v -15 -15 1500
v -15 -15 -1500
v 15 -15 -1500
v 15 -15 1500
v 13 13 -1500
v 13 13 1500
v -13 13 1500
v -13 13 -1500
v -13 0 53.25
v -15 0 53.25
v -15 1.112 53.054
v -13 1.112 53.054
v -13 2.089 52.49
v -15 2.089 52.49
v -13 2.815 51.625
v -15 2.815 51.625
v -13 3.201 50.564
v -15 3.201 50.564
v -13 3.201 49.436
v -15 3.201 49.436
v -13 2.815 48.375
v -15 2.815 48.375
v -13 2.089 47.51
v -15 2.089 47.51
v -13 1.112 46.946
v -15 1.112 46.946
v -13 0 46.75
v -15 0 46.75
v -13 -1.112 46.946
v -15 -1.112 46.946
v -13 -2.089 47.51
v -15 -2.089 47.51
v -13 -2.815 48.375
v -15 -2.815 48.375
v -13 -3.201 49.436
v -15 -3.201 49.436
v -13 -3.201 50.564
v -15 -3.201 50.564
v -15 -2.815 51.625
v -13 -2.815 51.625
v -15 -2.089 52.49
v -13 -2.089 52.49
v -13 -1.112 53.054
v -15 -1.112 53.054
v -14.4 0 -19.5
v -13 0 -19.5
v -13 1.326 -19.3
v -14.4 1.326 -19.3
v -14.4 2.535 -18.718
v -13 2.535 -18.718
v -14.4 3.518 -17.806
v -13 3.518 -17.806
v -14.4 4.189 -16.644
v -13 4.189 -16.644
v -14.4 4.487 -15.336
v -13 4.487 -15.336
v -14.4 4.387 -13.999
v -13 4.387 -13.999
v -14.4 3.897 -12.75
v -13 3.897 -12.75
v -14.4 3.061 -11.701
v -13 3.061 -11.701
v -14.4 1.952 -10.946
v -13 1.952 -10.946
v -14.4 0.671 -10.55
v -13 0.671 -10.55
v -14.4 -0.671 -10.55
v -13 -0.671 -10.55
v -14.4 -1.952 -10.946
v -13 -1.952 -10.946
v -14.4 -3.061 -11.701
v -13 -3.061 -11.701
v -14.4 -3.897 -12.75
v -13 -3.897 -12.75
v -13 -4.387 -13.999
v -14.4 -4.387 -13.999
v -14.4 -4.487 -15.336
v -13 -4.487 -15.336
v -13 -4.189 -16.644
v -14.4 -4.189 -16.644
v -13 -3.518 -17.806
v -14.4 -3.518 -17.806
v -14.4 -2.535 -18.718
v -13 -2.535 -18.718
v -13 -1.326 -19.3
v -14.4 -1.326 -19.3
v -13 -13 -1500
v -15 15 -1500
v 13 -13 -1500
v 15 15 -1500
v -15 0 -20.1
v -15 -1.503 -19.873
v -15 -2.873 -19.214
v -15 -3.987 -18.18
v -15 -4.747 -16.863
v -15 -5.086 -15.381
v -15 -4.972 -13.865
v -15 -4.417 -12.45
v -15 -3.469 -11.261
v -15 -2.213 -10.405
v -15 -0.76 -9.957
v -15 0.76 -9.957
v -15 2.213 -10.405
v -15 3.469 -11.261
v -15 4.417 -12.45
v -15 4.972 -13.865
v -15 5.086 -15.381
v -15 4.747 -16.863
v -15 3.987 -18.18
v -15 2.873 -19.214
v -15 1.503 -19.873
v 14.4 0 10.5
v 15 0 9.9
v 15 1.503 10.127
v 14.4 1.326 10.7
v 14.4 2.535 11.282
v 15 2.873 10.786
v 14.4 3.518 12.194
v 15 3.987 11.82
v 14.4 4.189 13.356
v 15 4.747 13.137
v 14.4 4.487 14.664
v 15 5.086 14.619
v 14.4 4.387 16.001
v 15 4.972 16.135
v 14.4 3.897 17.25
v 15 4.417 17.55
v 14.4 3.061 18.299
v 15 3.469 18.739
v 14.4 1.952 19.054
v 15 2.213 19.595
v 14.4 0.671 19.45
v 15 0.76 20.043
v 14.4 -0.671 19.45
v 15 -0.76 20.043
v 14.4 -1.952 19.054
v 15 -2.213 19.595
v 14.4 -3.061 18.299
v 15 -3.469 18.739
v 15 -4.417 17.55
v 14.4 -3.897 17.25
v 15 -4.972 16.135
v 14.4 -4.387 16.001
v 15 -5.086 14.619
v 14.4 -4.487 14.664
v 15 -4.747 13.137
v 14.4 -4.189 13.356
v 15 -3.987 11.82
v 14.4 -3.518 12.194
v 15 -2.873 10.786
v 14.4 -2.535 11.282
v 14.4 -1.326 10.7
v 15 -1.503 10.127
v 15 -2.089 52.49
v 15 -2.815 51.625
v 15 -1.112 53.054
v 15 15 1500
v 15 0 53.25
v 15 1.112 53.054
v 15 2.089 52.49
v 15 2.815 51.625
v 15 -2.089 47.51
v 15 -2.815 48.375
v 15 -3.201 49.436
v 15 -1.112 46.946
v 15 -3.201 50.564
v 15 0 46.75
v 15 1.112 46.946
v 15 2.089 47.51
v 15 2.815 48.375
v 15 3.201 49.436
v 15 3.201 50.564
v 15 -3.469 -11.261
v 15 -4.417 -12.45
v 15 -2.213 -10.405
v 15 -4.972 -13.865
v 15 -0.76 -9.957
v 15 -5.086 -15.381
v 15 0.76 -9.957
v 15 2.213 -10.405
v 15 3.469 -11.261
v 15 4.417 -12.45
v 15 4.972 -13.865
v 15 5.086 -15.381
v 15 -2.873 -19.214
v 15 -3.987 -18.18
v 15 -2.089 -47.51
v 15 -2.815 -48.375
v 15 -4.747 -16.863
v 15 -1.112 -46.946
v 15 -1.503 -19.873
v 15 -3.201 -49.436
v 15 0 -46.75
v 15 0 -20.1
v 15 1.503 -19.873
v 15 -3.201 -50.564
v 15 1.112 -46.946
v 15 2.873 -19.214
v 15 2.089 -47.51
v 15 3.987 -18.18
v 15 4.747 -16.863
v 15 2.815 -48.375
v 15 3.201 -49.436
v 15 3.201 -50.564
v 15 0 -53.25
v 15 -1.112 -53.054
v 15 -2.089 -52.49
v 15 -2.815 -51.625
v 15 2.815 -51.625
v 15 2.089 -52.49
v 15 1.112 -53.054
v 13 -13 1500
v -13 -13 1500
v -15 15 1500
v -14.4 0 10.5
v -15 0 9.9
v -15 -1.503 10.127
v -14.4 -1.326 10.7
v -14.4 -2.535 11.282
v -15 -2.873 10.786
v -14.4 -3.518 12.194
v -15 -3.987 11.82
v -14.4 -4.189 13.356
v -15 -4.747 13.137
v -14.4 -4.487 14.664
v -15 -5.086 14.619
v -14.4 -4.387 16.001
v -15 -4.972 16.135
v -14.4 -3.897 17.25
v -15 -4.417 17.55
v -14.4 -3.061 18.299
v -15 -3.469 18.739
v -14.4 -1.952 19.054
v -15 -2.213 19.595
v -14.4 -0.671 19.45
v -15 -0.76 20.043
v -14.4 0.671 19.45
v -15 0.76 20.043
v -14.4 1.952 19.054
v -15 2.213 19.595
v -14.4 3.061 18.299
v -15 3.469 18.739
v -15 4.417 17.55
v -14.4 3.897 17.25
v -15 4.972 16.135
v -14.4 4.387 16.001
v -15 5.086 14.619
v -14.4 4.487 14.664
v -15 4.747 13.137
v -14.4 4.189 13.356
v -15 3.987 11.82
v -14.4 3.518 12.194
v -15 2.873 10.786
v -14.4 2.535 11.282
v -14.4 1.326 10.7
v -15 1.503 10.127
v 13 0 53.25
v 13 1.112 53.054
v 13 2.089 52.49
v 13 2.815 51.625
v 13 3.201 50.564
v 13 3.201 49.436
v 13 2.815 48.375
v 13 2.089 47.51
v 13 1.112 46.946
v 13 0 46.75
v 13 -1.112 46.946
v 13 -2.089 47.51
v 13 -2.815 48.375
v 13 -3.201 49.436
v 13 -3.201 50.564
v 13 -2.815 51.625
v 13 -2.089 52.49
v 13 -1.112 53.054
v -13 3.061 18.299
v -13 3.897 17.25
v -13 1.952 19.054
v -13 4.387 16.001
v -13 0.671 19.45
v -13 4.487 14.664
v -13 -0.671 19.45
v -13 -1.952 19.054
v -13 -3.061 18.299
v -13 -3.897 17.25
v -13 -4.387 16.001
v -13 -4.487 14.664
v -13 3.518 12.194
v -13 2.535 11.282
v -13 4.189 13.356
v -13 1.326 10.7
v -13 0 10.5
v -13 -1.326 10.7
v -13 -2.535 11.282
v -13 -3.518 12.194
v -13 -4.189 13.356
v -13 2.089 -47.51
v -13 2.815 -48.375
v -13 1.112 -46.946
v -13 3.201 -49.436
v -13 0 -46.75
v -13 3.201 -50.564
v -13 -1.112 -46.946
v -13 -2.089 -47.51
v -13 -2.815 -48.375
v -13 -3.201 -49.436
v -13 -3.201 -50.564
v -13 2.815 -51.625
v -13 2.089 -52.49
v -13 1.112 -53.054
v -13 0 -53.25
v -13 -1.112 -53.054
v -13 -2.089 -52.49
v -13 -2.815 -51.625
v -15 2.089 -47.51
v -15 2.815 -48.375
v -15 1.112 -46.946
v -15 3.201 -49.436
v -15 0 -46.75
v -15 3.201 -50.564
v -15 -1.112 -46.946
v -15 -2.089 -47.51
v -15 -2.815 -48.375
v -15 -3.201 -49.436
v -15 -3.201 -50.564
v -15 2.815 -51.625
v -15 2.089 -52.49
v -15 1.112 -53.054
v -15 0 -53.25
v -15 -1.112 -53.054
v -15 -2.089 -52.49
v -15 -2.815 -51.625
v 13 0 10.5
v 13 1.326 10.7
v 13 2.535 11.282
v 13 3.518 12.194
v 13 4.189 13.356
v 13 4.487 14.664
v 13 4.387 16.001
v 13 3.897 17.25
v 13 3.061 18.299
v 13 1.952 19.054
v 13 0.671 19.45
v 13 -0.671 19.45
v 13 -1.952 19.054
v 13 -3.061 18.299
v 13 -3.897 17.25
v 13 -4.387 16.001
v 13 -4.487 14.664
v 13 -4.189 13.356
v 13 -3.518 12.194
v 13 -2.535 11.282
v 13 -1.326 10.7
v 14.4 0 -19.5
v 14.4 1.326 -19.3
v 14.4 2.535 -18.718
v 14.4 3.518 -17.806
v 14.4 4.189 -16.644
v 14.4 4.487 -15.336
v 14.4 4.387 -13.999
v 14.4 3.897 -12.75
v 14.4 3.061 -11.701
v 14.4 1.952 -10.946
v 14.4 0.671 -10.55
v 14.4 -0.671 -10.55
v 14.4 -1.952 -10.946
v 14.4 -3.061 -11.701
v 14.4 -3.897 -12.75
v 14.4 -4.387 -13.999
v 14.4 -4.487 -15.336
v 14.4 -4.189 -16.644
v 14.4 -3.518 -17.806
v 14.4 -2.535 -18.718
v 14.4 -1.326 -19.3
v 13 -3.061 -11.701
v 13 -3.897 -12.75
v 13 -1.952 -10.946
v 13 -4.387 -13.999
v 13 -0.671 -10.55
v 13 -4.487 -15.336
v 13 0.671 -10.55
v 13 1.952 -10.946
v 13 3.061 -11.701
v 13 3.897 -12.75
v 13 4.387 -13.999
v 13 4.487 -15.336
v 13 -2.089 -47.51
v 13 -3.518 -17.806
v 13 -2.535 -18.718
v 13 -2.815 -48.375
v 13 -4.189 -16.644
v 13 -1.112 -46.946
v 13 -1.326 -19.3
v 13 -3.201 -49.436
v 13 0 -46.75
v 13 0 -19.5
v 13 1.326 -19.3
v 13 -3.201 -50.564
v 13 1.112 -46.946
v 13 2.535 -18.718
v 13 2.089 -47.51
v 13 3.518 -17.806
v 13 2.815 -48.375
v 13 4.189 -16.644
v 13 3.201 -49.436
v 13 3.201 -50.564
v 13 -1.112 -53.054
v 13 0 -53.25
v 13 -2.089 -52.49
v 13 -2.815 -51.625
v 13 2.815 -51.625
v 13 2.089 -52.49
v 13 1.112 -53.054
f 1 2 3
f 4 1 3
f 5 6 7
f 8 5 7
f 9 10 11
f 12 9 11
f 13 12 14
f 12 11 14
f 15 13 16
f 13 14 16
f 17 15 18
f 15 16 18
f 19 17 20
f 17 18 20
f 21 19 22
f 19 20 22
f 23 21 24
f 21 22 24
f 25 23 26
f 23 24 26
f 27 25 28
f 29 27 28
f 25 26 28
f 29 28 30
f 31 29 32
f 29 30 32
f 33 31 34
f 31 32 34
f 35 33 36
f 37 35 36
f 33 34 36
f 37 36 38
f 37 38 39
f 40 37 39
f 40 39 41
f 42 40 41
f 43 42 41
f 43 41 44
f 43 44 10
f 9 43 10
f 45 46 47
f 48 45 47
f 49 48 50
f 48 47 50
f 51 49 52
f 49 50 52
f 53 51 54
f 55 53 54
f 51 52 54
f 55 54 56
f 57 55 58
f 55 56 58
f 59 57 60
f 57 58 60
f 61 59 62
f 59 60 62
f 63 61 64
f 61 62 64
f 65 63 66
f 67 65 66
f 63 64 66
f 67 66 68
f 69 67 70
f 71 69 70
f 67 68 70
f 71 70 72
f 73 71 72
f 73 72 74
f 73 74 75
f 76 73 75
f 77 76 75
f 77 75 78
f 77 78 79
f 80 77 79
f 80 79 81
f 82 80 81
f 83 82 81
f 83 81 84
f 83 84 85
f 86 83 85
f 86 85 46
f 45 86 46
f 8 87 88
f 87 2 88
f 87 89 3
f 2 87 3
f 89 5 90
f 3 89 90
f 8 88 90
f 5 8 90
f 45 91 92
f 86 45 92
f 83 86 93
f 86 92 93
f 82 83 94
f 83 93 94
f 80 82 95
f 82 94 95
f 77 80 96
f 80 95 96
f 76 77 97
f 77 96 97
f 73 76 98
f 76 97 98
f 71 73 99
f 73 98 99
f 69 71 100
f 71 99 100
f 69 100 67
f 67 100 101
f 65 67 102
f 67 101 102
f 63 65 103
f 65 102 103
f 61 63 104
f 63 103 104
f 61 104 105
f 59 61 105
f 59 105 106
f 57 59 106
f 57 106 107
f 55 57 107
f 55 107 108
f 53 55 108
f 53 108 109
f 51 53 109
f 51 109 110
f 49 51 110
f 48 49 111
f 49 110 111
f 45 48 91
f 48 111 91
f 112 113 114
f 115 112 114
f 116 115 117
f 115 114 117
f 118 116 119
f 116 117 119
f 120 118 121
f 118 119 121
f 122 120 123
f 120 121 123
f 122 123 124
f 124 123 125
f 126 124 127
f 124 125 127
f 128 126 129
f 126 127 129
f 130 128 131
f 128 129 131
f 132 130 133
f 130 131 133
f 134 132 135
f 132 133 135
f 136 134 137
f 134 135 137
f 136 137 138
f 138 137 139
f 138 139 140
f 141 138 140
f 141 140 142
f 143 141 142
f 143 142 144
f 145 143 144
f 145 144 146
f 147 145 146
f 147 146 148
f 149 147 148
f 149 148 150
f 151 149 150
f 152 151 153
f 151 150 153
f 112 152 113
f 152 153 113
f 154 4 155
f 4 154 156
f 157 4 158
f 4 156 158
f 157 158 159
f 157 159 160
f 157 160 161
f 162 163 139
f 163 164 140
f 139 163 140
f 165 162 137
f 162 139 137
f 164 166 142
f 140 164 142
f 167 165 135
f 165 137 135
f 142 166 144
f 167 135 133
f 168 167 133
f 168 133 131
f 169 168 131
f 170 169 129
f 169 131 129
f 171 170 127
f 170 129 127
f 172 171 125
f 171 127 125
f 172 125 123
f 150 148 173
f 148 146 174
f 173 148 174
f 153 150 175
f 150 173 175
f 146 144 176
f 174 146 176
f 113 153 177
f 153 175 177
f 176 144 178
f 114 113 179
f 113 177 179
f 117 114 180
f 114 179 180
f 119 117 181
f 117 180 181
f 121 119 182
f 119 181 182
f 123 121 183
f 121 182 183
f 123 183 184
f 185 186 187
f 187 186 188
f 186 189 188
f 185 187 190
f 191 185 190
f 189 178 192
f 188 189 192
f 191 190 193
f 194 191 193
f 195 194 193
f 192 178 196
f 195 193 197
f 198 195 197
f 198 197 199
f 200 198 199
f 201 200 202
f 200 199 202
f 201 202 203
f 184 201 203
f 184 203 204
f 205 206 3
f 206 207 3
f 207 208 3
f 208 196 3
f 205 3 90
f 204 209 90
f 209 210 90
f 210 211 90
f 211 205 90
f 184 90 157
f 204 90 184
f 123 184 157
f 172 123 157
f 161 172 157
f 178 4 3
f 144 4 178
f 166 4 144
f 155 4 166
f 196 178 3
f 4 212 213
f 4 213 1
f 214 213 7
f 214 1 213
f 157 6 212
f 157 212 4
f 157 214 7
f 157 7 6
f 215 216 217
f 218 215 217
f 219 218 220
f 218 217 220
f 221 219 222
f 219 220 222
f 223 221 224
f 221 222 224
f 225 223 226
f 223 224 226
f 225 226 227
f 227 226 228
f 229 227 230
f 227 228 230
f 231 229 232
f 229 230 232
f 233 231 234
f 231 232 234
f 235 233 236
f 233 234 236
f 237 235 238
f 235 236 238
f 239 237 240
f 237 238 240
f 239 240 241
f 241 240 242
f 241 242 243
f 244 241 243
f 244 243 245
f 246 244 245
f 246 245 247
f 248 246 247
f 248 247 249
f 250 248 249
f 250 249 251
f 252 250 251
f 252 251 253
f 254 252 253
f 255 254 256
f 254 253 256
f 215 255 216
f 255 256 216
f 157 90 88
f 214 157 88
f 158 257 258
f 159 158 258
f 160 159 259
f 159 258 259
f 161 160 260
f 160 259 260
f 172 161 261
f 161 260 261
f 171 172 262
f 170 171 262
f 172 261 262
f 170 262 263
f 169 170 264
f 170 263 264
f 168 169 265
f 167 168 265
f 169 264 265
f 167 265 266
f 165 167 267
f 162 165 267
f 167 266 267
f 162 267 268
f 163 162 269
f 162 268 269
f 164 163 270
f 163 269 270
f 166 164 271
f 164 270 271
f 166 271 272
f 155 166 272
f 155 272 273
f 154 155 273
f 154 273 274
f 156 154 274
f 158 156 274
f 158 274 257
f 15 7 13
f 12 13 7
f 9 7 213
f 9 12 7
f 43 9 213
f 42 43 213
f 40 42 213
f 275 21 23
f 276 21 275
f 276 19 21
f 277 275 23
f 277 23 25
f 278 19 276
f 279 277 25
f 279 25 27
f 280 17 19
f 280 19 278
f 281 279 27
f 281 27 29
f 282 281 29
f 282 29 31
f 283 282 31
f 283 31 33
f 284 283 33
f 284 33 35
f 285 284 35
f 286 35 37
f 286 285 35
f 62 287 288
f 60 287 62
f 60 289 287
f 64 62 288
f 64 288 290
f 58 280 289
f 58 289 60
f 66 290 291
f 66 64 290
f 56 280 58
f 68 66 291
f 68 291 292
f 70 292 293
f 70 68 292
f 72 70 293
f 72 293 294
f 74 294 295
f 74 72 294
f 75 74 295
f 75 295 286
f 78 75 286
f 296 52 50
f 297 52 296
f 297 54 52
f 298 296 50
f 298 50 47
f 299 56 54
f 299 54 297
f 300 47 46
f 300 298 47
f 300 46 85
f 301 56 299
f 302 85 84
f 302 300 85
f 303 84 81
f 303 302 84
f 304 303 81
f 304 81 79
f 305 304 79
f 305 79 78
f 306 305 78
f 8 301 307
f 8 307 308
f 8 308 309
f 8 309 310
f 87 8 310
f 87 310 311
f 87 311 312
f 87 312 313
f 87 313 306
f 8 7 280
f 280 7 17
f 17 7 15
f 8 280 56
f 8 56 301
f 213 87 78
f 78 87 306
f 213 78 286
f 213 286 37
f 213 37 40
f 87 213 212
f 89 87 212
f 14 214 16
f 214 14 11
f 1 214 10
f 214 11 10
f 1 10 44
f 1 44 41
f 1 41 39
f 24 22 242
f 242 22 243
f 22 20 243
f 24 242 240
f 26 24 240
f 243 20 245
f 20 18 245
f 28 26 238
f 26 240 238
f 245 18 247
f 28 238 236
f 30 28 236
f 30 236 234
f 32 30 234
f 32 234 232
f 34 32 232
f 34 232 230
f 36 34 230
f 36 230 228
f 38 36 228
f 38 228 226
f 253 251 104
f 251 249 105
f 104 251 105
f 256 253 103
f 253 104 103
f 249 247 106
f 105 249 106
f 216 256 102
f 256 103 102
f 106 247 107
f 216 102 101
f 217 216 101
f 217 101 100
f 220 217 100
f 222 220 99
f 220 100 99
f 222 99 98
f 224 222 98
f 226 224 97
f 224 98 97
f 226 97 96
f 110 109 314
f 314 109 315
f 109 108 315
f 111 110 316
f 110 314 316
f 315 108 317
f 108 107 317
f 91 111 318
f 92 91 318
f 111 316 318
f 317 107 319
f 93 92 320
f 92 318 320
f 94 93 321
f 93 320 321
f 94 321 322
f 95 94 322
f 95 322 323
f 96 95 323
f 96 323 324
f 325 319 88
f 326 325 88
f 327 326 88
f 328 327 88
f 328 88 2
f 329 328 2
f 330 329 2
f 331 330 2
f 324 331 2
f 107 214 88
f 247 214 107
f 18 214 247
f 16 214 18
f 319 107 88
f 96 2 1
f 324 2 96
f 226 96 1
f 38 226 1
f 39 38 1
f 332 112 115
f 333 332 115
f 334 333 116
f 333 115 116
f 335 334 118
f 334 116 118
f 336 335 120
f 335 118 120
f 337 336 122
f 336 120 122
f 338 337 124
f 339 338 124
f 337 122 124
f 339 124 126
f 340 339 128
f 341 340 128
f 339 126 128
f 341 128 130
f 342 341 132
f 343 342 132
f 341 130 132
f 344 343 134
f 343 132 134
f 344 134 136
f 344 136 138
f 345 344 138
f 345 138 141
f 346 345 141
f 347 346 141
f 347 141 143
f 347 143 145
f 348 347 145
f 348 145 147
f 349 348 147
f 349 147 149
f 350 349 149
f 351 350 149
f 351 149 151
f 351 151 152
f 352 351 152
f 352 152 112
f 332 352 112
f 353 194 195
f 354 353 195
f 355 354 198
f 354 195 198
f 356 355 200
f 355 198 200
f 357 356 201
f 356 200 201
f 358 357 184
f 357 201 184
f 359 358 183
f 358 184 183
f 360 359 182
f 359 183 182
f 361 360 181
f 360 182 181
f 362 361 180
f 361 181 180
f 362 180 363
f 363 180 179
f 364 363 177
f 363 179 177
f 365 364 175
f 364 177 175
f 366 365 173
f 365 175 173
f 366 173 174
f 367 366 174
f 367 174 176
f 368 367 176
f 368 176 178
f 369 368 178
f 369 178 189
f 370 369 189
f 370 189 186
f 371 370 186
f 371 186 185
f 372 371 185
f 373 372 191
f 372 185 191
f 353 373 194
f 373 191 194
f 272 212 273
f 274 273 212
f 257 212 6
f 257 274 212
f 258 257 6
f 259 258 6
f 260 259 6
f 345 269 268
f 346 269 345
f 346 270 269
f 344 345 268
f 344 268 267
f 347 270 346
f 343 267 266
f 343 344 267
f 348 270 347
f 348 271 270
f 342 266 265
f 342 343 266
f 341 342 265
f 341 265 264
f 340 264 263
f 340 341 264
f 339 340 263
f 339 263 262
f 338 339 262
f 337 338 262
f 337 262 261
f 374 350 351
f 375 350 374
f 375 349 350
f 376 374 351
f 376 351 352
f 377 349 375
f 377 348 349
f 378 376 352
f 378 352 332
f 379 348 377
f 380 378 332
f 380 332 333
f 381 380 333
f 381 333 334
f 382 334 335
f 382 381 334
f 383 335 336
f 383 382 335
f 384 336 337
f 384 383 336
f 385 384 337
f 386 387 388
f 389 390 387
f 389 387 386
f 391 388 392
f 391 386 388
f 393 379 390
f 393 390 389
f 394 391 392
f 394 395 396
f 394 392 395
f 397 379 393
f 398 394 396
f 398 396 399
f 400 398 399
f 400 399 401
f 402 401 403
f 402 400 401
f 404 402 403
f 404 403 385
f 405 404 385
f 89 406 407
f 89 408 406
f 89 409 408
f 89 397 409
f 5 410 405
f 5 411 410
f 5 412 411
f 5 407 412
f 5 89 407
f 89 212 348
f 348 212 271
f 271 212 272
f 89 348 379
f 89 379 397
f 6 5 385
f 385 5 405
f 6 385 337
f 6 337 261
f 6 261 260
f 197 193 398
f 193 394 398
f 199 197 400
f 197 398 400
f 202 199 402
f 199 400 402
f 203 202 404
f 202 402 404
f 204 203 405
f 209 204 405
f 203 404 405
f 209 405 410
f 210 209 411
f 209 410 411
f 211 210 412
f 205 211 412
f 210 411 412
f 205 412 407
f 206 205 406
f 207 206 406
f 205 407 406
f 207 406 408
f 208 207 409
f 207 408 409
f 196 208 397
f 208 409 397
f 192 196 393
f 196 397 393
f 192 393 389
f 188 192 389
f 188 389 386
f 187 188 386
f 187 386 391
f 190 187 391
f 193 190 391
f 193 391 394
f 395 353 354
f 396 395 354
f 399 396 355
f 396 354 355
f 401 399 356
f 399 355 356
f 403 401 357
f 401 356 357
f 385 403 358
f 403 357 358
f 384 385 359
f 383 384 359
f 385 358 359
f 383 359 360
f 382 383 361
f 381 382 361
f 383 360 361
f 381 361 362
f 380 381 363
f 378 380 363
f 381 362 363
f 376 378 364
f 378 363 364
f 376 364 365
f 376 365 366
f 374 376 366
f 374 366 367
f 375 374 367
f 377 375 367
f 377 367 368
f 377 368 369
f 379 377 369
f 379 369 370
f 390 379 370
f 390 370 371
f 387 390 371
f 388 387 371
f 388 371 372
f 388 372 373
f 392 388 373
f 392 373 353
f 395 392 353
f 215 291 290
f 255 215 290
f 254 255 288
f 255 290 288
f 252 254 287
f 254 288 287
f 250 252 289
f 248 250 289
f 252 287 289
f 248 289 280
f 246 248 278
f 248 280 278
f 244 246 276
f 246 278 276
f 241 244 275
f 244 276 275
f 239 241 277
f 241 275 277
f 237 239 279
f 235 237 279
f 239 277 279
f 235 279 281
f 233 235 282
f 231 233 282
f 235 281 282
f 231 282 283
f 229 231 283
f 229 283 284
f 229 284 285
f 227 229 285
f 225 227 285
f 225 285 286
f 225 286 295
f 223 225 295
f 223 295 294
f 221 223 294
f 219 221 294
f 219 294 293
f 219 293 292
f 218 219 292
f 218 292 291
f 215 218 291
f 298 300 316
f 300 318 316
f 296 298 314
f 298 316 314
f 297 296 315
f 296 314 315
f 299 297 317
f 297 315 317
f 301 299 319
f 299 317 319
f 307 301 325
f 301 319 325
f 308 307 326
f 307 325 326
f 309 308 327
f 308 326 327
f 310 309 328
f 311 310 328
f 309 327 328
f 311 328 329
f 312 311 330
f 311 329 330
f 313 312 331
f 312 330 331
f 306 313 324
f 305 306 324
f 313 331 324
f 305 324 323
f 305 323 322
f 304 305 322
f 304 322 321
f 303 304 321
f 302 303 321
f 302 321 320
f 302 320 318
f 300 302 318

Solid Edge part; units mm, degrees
sketch "Sketch1" plane through (0, 0, 0) normal (0, 0, 1) x (1, 0, 0)
  line L0 (-15, -15) -> (15, -15)
  line L1 (15, -15) -> (15, 15)
  line L2 (15, 15) -> (-15, 15)
  line L3 (-15, 15) -> (-15, -15)
  line L4 (-13, -13) -> (13, -13)
  line L5 (13, -13) -> (13, 13)
  line L6 (13, 13) -> (-13, 13)
  line L7 (-13, 13) -> (-13, -13)
  dimension "D1" = 30
  dimension "D2" = 30
  dimension "D3" = 2
extrude "body" add sketch "Sketch1" along normal mid plane 3000
hole "Hole_2" at (15, 0, 15) direction (-1, 0, 0) diameter 9 end through all start chamfer 0.6 start chamfer angle 45 end chamfer 0.6 end chamfer angle 45
hole "Hole1" at (15, 0, -15) direction (-1, 0, 0) diameter 9 end through all start chamfer 0.6 start chamfer angle 45 end chamfer 0.6 end chamfer angle 45
sketch "Sketch2" plane through (-15, 0, 0) normal (-1, 0, 0) x (0, 0, 1)
  circle A0 centre (-50, 0) radius 3.25
  circle A1 centre (50, 0) radius 3.25
  dimension "D1" = 6.5
  dimension "D2" = 100
extrude "Cutout1" cut sketch "Sketch2" against normal through all
properties material "Aluminum, 7075-T6"
